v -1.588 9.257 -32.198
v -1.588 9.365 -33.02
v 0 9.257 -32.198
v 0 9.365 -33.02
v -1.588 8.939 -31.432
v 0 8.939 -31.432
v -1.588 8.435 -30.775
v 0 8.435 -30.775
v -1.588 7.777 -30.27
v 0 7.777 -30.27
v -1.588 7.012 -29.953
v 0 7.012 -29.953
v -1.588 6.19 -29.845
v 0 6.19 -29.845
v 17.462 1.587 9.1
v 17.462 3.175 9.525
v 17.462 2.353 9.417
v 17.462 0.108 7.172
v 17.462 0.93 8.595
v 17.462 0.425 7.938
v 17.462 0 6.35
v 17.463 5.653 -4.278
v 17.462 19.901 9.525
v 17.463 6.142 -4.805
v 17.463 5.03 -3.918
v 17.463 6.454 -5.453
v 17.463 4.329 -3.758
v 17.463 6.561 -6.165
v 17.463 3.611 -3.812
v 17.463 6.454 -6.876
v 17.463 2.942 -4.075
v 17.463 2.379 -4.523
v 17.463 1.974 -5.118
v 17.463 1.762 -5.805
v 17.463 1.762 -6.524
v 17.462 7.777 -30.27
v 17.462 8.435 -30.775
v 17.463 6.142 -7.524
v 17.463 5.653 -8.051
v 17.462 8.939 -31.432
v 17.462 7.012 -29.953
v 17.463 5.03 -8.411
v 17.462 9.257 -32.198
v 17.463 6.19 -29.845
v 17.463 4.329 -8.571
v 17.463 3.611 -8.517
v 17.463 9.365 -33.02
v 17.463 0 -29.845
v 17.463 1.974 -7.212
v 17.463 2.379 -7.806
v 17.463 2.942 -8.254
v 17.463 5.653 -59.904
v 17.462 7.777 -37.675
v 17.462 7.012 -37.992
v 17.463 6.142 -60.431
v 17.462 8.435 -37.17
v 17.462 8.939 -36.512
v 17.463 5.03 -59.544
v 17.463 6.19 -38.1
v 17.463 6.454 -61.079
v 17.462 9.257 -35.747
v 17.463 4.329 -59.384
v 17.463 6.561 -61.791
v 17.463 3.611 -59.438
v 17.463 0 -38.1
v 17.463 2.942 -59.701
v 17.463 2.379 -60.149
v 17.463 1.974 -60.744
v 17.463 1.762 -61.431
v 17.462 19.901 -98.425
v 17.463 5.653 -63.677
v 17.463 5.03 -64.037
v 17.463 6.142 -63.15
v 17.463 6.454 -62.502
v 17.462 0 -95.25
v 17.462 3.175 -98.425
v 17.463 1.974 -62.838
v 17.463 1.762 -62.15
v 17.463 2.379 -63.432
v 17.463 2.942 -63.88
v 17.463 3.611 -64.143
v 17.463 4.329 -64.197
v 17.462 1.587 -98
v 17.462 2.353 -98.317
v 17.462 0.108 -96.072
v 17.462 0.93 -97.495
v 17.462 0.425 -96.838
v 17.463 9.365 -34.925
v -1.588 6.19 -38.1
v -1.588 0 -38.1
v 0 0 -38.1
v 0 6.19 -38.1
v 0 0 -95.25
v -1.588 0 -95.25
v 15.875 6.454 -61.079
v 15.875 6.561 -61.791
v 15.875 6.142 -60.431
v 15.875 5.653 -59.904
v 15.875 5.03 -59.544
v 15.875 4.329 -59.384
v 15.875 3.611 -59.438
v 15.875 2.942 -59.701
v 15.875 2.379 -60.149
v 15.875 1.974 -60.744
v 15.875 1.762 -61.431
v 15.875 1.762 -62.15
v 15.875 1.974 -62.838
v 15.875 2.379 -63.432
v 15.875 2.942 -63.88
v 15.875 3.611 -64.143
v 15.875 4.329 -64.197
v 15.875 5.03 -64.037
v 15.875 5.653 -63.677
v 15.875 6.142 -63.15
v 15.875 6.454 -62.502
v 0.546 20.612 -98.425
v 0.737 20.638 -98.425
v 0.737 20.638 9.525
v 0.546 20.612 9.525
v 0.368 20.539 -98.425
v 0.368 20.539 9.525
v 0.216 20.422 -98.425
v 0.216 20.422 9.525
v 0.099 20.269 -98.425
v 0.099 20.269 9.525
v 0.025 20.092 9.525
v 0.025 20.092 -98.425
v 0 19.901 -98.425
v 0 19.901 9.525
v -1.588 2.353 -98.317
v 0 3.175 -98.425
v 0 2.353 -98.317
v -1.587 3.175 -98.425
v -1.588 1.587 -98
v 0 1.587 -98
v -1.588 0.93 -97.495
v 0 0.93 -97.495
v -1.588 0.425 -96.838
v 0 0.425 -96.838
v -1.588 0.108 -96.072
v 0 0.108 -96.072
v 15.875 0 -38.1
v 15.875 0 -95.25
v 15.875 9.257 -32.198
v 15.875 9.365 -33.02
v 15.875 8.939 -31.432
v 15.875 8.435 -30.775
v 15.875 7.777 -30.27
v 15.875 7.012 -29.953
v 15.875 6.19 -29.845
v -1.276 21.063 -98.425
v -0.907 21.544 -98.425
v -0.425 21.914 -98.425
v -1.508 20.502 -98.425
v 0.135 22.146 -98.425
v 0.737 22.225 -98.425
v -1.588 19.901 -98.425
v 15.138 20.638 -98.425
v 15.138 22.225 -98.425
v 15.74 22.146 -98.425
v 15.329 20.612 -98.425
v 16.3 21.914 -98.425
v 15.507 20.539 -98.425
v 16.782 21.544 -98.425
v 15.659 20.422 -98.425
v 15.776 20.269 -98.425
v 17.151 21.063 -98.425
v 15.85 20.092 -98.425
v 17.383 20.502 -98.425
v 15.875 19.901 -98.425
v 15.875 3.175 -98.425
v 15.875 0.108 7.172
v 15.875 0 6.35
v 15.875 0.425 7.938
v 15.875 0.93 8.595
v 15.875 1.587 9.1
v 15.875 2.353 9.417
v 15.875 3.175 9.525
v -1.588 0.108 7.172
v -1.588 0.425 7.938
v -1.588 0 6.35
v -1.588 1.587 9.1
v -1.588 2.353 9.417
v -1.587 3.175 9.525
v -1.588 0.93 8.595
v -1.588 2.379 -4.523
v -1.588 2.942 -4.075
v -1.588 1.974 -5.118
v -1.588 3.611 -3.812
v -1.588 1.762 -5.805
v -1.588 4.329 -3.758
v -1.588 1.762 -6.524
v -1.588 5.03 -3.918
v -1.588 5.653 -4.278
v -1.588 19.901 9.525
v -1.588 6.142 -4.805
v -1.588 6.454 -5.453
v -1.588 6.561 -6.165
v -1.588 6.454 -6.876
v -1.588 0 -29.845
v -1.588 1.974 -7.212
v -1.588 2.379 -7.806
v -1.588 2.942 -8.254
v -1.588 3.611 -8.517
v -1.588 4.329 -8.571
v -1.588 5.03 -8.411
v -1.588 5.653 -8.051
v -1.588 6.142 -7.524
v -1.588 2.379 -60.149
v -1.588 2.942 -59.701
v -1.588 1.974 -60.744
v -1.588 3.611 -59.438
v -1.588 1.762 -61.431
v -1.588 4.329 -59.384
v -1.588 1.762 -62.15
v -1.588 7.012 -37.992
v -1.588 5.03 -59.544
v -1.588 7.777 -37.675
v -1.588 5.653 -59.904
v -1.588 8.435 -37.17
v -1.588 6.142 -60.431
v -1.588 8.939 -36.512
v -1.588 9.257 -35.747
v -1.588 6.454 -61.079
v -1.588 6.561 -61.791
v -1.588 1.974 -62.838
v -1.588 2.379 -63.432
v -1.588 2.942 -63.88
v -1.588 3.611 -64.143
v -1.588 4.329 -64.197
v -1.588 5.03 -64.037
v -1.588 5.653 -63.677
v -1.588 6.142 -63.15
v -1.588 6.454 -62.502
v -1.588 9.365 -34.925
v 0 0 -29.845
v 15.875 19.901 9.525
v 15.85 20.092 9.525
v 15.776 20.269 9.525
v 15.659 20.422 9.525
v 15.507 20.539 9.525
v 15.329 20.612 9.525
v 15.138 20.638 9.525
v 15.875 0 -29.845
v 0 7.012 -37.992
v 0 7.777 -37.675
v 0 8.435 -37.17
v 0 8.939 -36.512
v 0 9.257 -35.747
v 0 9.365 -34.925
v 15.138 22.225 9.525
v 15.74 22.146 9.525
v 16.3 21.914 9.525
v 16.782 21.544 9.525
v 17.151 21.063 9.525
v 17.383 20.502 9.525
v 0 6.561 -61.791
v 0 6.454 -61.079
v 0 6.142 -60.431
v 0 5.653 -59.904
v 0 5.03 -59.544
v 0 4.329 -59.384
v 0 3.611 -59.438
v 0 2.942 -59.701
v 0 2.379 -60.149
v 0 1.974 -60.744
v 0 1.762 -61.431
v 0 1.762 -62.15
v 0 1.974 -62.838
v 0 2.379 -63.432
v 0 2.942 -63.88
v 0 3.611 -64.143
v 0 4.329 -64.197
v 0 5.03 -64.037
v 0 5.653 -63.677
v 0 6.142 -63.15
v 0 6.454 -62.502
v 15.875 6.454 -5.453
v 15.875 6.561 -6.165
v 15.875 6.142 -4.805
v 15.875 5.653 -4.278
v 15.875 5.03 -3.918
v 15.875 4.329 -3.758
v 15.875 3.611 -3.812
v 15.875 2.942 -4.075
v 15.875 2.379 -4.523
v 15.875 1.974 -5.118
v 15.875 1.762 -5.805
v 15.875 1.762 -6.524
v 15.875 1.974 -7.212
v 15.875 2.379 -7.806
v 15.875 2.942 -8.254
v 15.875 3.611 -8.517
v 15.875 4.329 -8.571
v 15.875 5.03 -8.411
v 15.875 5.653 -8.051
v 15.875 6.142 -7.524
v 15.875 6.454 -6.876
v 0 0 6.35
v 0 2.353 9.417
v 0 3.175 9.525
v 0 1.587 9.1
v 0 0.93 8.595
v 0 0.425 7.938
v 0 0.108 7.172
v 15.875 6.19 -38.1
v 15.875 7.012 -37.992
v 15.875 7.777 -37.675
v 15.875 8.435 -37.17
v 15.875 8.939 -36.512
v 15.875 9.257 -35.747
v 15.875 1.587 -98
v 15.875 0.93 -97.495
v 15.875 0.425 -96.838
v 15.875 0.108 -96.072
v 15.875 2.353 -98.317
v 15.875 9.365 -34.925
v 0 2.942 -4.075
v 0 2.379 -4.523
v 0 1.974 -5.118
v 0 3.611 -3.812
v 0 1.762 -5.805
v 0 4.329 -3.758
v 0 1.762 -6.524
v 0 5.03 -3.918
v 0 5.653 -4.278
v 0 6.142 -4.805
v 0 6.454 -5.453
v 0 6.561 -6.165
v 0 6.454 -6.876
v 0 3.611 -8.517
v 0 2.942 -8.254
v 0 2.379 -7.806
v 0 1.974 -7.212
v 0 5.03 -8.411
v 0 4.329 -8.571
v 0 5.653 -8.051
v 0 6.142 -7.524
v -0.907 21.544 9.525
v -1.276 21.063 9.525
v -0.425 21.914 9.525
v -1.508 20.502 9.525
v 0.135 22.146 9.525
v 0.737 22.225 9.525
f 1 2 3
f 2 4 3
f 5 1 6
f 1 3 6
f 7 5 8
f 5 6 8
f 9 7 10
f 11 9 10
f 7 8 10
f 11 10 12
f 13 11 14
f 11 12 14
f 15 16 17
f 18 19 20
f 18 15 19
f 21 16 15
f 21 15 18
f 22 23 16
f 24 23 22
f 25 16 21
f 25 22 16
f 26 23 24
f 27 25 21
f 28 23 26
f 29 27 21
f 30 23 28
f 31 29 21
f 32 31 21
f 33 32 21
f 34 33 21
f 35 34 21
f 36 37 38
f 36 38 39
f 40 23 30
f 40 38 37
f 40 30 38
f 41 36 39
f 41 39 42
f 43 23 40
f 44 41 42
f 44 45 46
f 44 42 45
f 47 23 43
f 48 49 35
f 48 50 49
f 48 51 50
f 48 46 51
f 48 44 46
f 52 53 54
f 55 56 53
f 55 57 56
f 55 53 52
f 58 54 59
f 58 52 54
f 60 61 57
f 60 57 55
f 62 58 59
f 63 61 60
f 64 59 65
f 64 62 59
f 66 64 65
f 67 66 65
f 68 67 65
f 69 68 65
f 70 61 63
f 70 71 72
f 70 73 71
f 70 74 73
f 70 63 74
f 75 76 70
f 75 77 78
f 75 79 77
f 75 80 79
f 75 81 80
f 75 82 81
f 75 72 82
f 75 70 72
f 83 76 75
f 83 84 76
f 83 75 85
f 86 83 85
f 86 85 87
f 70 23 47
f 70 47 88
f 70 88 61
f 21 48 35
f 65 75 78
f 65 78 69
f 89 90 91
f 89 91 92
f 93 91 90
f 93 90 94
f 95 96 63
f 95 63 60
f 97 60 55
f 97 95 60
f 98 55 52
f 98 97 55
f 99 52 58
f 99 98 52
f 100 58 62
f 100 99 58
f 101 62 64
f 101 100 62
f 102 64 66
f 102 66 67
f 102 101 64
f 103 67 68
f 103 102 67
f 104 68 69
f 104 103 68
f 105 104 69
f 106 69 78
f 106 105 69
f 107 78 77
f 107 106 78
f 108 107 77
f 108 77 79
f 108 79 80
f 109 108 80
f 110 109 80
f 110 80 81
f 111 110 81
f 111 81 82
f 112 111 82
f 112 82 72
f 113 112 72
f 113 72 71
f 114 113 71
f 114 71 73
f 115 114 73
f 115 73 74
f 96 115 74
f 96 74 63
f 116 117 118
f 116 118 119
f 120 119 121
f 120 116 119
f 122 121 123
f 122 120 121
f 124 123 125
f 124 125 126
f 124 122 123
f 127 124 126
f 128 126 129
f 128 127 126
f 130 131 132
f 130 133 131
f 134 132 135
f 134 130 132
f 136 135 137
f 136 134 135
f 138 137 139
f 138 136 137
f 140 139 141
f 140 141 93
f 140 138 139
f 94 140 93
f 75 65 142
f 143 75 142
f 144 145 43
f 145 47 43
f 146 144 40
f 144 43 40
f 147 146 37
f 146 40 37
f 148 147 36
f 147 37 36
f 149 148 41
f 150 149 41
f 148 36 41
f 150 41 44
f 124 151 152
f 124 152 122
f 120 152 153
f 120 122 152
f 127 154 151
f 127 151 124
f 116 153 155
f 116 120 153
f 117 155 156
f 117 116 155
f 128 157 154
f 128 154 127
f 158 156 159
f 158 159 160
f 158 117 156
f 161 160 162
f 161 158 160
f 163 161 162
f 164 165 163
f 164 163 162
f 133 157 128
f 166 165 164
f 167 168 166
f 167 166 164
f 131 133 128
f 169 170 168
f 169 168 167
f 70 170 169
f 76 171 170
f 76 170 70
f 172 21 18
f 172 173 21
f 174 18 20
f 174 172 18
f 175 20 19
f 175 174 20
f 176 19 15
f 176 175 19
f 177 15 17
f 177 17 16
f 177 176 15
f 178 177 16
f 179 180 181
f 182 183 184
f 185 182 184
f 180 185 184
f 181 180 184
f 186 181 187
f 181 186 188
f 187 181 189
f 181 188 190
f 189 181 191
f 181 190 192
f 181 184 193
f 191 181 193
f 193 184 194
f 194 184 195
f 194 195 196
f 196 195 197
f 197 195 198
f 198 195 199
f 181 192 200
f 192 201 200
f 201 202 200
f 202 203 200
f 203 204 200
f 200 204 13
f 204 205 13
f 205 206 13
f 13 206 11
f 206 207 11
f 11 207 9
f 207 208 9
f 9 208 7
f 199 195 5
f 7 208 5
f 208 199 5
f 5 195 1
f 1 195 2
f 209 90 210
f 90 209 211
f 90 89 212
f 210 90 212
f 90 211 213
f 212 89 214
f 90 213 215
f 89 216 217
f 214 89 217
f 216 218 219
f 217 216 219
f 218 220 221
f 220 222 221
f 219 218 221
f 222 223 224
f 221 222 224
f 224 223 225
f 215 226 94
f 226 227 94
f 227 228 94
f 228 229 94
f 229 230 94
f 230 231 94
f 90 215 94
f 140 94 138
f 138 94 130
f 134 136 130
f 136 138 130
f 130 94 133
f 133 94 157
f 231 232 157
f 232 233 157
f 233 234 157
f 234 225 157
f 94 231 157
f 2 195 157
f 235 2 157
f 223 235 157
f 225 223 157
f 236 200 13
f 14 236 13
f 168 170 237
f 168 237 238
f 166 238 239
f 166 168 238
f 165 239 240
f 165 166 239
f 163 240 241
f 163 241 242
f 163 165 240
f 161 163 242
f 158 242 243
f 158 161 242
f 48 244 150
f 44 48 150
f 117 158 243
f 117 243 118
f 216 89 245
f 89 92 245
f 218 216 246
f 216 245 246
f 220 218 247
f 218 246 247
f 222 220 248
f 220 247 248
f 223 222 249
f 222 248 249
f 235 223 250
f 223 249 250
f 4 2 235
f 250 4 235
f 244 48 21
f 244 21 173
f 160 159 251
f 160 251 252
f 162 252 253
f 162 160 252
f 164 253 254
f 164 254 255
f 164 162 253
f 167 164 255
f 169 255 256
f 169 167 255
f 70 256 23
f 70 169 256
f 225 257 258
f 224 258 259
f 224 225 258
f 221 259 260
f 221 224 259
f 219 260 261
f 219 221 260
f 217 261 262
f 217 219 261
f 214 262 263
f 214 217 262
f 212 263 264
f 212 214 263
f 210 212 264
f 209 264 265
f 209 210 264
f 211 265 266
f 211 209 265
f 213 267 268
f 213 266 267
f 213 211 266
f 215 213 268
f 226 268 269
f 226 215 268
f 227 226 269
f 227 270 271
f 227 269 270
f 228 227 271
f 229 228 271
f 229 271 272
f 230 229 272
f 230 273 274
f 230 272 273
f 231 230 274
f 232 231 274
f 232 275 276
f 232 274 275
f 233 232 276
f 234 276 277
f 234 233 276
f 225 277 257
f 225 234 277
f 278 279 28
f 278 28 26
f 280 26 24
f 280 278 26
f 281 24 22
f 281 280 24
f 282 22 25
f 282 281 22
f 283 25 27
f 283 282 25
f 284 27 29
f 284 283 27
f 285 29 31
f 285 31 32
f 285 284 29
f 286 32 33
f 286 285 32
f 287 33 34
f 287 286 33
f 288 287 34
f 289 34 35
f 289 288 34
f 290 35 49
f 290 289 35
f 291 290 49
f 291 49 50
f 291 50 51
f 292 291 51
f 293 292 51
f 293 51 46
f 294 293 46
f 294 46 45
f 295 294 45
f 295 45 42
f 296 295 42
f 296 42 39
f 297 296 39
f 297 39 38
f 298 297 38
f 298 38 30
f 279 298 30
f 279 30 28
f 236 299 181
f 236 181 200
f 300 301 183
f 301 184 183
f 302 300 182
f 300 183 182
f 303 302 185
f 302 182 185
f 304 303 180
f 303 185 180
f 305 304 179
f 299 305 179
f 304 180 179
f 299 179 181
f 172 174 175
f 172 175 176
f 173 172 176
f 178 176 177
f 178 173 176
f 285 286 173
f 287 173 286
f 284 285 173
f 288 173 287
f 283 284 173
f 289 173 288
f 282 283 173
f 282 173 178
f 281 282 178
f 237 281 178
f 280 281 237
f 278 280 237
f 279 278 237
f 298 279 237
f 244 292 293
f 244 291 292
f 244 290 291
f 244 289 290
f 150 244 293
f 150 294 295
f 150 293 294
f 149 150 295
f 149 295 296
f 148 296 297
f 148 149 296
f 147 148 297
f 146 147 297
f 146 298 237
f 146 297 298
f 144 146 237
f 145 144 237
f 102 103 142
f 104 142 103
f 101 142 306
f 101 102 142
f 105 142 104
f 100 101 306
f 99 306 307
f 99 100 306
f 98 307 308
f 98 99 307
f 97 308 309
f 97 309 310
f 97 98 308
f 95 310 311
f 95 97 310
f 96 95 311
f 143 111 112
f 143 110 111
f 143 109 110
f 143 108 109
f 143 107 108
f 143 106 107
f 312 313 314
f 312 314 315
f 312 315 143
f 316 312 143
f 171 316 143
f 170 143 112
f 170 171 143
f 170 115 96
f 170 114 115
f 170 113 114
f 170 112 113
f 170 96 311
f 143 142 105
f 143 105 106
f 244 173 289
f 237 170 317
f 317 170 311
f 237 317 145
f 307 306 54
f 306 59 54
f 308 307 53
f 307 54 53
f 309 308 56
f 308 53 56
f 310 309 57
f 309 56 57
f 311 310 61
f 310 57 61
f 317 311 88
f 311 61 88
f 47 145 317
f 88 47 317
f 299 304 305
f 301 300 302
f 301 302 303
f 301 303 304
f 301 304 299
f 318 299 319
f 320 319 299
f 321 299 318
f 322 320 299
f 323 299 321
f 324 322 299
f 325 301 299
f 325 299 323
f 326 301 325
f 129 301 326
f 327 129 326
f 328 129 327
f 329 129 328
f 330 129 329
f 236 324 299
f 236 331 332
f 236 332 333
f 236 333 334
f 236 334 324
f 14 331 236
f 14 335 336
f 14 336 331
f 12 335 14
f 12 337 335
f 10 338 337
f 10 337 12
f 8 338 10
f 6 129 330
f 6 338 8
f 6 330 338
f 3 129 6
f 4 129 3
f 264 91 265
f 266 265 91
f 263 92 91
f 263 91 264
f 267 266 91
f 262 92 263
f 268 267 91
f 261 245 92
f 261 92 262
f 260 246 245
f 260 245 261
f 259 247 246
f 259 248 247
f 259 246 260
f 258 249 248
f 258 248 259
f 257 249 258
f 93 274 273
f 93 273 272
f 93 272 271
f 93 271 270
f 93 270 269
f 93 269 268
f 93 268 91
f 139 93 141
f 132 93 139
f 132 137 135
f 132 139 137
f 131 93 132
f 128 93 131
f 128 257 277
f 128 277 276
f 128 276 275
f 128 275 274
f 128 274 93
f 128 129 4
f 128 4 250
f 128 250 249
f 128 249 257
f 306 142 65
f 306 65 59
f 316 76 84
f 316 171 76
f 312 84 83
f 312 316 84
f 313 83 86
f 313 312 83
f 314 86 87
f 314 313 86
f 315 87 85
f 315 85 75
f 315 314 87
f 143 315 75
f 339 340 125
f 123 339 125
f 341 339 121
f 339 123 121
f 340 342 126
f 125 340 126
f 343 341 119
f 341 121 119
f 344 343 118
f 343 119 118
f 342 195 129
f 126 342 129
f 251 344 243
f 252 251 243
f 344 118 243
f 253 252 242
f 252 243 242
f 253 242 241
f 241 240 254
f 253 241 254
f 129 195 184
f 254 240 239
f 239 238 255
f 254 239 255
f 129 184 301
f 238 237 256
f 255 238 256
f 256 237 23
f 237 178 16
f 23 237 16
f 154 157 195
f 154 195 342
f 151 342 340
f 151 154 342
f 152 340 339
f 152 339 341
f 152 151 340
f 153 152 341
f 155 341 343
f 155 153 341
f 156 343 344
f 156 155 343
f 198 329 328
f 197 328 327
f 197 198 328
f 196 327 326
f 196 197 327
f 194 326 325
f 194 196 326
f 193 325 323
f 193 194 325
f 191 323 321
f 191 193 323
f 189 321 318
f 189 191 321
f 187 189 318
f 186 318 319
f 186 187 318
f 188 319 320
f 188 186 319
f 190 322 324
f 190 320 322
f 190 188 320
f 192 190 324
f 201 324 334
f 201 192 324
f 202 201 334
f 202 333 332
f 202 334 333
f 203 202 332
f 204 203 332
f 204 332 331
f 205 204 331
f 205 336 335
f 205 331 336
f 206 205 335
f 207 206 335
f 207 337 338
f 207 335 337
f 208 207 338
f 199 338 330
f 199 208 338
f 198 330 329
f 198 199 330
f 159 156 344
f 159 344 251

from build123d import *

# Parameters (mm, degrees)
BASE_FLANGE1_DEPTH           = 1.5875
EDGE_FLANGE1_STRIP_W         = 7.8232
EDGE_FLANGE1_STRIP_H         = 1.5875
EDGE_FLANGE1_STRIP_CUT_DEPTH = 107.95
EDGE_FLANGE1_DEPTH           = 107.95
EDGE_FLANGE2_STRIP_W         = 7.8232
EDGE_FLANGE2_STRIP_H         = 1.5875
EDGE_FLANGE2_STRIP_CUT_DEPTH = 107.95
EDGE_FLANGE2_DEPTH           = 107.95
HOLE1_START                  = -1.5875
HOLE1_OUTLINE_R              = 2.413
HOLE1_DEPTH                  = 19.05
CUT_EXTRUDE1_DEPTH           = 103.402979235
CUT_EXTRUDE1_DEPTH_BACK      = 103.402979235
SKETCH27_W                   = 8.255
SKETCH27_H                   = 9.364783331
FILLET1_R                    = 3.175


# Read off the part's stored shape, not the designer's step: Hole1
# Sheet-metal steps are written as plain solids
with BuildPart() as part:
    # Sketch1 → Base-Flange1 (new body)
    with BuildSketch(Plane(origin=(0, 0, 0), x_dir=(0, 0, -1), z_dir=(1, 0, 0))):
        Polygon((0, 0), (88.9, 0), (98.425, 0), (98.425, 22.225), (88.9, 22.225), (0, 22.225), (-9.525, 22.225), (-9.525, 0), align=None)
    extrude(amount=-BASE_FLANGE1_DEPTH)

    # Edge-Flange1 strip (across the edge) → Edge-Flange1 strip cut (cut)
    with BuildSketch(Plane(origin=(0, 22.225, -98.425), x_dir=(0, -1, 0), z_dir=(0, 0, 1))):
        with Locations((-1.5875, -0.79375)):
            Rectangle(EDGE_FLANGE1_STRIP_W, EDGE_FLANGE1_STRIP_H)
    extrude(amount=EDGE_FLANGE1_STRIP_CUT_DEPTH, mode=Mode.SUBTRACT)

    # Edge-Flange1 section (across the edge) → Edge-Flange1 (add)
    with BuildSketch(Plane(origin=(0, 22.225, -98.425), x_dir=(0, -1, 0), z_dir=(0, 0, 1))):
        with BuildLine():
            Line((0, 0.7366), (0, 17.4625))
            Line((0, 17.4625), (1.5875, 17.4625))
            Line((1.5875, 17.4625), (1.5875, 0.7366))
            ThreePointArc((1.5875, 0.7366), (1.803245145, 0.215745145), (2.3241, 0))
            Line((2.3241, 0), (2.3241, -1.5875))
            ThreePointArc((2.3241, -1.5875), (0.68071313, -0.90678687), (0, 0.7366))
        make_face()
    extrude(amount=EDGE_FLANGE1_DEPTH)

    # Edge-Flange2 strip (across the edge) → Edge-Flange2 strip cut (cut)
    with BuildSketch(Plane(origin=(17.4625, 20.6375, -98.425), x_dir=(-1, 0, 0), z_dir=(0, 0, 1))):
        with Locations((-1.5875, -0.79375)):
            Rectangle(EDGE_FLANGE2_STRIP_W, EDGE_FLANGE2_STRIP_H)
    extrude(amount=EDGE_FLANGE2_STRIP_CUT_DEPTH, mode=Mode.SUBTRACT)

    # Edge-Flange2 section (across the edge) → Edge-Flange2 (add)
    with BuildSketch(Plane(origin=(17.4625, 20.6375, -98.425), x_dir=(-1, 0, 0), z_dir=(0, 0, 1))):
        with BuildLine():
            Line((0, 0.7366), (0, 20.6375))
            Line((0, 20.6375), (1.5875, 20.6375))
            Line((1.5875, 20.6375), (1.5875, 0.7366))
            ThreePointArc((1.5875, 0.7366), (1.803245145, 0.215745145), (2.3241, 0))
            Line((2.3241, 0), (2.3241, -1.5875))
            ThreePointArc((2.3241, -1.5875), (0.68071313, -0.90678687), (0, 0.7366))
        make_face()
    extrude(amount=EDGE_FLANGE2_DEPTH)

    # Hole1 outline → Hole1 (cut)
    with BuildSketch(Plane.YZ.offset(HOLE1_START)):
        with Locations((4.148353843, -61.790618702)):
            Circle(HOLE1_OUTLINE_R)
        with Locations((4.148353843, -6.164618702)):
            Circle(HOLE1_OUTLINE_R)
    extrude(amount=HOLE1_DEPTH, mode=Mode.SUBTRACT)

    # Sketch27 → Cut-Extrude1 (cut, two sides: drawn at the far end of the back side and taken through both)
    with BuildSketch(Plane(origin=(0, 0, 0), x_dir=(0, 0, -1), z_dir=(1, 0, 0)).offset(-CUT_EXTRUDE1_DEPTH_BACK)):
        with Locations((33.9725, 4.682391665)):
            Rectangle(SKETCH27_W, SKETCH27_H)
    extrude(amount=CUT_EXTRUDE1_DEPTH + CUT_EXTRUDE1_DEPTH_BACK, mode=Mode.SUBTRACT)

    # Fillet1
    fillet1_edges = [part.edges().sort_by_distance(p)[0] for p in [
        (-0.79375, 9.364783331, -29.845),
        (-0.79375, 9.364783331, -38.1),
        (16.66875, 9.364783331, -29.845),
        (16.66875, 9.364783331, -38.1),
        (-0.79375, 0, 9.525),
        (-0.79375, 0, -98.425),
        (16.66875, 0, -98.425),
        (16.66875, 0, 9.525),
    ]]
    fillet(fillet1_edges, radius=FILLET1_R)


solid = part.part
